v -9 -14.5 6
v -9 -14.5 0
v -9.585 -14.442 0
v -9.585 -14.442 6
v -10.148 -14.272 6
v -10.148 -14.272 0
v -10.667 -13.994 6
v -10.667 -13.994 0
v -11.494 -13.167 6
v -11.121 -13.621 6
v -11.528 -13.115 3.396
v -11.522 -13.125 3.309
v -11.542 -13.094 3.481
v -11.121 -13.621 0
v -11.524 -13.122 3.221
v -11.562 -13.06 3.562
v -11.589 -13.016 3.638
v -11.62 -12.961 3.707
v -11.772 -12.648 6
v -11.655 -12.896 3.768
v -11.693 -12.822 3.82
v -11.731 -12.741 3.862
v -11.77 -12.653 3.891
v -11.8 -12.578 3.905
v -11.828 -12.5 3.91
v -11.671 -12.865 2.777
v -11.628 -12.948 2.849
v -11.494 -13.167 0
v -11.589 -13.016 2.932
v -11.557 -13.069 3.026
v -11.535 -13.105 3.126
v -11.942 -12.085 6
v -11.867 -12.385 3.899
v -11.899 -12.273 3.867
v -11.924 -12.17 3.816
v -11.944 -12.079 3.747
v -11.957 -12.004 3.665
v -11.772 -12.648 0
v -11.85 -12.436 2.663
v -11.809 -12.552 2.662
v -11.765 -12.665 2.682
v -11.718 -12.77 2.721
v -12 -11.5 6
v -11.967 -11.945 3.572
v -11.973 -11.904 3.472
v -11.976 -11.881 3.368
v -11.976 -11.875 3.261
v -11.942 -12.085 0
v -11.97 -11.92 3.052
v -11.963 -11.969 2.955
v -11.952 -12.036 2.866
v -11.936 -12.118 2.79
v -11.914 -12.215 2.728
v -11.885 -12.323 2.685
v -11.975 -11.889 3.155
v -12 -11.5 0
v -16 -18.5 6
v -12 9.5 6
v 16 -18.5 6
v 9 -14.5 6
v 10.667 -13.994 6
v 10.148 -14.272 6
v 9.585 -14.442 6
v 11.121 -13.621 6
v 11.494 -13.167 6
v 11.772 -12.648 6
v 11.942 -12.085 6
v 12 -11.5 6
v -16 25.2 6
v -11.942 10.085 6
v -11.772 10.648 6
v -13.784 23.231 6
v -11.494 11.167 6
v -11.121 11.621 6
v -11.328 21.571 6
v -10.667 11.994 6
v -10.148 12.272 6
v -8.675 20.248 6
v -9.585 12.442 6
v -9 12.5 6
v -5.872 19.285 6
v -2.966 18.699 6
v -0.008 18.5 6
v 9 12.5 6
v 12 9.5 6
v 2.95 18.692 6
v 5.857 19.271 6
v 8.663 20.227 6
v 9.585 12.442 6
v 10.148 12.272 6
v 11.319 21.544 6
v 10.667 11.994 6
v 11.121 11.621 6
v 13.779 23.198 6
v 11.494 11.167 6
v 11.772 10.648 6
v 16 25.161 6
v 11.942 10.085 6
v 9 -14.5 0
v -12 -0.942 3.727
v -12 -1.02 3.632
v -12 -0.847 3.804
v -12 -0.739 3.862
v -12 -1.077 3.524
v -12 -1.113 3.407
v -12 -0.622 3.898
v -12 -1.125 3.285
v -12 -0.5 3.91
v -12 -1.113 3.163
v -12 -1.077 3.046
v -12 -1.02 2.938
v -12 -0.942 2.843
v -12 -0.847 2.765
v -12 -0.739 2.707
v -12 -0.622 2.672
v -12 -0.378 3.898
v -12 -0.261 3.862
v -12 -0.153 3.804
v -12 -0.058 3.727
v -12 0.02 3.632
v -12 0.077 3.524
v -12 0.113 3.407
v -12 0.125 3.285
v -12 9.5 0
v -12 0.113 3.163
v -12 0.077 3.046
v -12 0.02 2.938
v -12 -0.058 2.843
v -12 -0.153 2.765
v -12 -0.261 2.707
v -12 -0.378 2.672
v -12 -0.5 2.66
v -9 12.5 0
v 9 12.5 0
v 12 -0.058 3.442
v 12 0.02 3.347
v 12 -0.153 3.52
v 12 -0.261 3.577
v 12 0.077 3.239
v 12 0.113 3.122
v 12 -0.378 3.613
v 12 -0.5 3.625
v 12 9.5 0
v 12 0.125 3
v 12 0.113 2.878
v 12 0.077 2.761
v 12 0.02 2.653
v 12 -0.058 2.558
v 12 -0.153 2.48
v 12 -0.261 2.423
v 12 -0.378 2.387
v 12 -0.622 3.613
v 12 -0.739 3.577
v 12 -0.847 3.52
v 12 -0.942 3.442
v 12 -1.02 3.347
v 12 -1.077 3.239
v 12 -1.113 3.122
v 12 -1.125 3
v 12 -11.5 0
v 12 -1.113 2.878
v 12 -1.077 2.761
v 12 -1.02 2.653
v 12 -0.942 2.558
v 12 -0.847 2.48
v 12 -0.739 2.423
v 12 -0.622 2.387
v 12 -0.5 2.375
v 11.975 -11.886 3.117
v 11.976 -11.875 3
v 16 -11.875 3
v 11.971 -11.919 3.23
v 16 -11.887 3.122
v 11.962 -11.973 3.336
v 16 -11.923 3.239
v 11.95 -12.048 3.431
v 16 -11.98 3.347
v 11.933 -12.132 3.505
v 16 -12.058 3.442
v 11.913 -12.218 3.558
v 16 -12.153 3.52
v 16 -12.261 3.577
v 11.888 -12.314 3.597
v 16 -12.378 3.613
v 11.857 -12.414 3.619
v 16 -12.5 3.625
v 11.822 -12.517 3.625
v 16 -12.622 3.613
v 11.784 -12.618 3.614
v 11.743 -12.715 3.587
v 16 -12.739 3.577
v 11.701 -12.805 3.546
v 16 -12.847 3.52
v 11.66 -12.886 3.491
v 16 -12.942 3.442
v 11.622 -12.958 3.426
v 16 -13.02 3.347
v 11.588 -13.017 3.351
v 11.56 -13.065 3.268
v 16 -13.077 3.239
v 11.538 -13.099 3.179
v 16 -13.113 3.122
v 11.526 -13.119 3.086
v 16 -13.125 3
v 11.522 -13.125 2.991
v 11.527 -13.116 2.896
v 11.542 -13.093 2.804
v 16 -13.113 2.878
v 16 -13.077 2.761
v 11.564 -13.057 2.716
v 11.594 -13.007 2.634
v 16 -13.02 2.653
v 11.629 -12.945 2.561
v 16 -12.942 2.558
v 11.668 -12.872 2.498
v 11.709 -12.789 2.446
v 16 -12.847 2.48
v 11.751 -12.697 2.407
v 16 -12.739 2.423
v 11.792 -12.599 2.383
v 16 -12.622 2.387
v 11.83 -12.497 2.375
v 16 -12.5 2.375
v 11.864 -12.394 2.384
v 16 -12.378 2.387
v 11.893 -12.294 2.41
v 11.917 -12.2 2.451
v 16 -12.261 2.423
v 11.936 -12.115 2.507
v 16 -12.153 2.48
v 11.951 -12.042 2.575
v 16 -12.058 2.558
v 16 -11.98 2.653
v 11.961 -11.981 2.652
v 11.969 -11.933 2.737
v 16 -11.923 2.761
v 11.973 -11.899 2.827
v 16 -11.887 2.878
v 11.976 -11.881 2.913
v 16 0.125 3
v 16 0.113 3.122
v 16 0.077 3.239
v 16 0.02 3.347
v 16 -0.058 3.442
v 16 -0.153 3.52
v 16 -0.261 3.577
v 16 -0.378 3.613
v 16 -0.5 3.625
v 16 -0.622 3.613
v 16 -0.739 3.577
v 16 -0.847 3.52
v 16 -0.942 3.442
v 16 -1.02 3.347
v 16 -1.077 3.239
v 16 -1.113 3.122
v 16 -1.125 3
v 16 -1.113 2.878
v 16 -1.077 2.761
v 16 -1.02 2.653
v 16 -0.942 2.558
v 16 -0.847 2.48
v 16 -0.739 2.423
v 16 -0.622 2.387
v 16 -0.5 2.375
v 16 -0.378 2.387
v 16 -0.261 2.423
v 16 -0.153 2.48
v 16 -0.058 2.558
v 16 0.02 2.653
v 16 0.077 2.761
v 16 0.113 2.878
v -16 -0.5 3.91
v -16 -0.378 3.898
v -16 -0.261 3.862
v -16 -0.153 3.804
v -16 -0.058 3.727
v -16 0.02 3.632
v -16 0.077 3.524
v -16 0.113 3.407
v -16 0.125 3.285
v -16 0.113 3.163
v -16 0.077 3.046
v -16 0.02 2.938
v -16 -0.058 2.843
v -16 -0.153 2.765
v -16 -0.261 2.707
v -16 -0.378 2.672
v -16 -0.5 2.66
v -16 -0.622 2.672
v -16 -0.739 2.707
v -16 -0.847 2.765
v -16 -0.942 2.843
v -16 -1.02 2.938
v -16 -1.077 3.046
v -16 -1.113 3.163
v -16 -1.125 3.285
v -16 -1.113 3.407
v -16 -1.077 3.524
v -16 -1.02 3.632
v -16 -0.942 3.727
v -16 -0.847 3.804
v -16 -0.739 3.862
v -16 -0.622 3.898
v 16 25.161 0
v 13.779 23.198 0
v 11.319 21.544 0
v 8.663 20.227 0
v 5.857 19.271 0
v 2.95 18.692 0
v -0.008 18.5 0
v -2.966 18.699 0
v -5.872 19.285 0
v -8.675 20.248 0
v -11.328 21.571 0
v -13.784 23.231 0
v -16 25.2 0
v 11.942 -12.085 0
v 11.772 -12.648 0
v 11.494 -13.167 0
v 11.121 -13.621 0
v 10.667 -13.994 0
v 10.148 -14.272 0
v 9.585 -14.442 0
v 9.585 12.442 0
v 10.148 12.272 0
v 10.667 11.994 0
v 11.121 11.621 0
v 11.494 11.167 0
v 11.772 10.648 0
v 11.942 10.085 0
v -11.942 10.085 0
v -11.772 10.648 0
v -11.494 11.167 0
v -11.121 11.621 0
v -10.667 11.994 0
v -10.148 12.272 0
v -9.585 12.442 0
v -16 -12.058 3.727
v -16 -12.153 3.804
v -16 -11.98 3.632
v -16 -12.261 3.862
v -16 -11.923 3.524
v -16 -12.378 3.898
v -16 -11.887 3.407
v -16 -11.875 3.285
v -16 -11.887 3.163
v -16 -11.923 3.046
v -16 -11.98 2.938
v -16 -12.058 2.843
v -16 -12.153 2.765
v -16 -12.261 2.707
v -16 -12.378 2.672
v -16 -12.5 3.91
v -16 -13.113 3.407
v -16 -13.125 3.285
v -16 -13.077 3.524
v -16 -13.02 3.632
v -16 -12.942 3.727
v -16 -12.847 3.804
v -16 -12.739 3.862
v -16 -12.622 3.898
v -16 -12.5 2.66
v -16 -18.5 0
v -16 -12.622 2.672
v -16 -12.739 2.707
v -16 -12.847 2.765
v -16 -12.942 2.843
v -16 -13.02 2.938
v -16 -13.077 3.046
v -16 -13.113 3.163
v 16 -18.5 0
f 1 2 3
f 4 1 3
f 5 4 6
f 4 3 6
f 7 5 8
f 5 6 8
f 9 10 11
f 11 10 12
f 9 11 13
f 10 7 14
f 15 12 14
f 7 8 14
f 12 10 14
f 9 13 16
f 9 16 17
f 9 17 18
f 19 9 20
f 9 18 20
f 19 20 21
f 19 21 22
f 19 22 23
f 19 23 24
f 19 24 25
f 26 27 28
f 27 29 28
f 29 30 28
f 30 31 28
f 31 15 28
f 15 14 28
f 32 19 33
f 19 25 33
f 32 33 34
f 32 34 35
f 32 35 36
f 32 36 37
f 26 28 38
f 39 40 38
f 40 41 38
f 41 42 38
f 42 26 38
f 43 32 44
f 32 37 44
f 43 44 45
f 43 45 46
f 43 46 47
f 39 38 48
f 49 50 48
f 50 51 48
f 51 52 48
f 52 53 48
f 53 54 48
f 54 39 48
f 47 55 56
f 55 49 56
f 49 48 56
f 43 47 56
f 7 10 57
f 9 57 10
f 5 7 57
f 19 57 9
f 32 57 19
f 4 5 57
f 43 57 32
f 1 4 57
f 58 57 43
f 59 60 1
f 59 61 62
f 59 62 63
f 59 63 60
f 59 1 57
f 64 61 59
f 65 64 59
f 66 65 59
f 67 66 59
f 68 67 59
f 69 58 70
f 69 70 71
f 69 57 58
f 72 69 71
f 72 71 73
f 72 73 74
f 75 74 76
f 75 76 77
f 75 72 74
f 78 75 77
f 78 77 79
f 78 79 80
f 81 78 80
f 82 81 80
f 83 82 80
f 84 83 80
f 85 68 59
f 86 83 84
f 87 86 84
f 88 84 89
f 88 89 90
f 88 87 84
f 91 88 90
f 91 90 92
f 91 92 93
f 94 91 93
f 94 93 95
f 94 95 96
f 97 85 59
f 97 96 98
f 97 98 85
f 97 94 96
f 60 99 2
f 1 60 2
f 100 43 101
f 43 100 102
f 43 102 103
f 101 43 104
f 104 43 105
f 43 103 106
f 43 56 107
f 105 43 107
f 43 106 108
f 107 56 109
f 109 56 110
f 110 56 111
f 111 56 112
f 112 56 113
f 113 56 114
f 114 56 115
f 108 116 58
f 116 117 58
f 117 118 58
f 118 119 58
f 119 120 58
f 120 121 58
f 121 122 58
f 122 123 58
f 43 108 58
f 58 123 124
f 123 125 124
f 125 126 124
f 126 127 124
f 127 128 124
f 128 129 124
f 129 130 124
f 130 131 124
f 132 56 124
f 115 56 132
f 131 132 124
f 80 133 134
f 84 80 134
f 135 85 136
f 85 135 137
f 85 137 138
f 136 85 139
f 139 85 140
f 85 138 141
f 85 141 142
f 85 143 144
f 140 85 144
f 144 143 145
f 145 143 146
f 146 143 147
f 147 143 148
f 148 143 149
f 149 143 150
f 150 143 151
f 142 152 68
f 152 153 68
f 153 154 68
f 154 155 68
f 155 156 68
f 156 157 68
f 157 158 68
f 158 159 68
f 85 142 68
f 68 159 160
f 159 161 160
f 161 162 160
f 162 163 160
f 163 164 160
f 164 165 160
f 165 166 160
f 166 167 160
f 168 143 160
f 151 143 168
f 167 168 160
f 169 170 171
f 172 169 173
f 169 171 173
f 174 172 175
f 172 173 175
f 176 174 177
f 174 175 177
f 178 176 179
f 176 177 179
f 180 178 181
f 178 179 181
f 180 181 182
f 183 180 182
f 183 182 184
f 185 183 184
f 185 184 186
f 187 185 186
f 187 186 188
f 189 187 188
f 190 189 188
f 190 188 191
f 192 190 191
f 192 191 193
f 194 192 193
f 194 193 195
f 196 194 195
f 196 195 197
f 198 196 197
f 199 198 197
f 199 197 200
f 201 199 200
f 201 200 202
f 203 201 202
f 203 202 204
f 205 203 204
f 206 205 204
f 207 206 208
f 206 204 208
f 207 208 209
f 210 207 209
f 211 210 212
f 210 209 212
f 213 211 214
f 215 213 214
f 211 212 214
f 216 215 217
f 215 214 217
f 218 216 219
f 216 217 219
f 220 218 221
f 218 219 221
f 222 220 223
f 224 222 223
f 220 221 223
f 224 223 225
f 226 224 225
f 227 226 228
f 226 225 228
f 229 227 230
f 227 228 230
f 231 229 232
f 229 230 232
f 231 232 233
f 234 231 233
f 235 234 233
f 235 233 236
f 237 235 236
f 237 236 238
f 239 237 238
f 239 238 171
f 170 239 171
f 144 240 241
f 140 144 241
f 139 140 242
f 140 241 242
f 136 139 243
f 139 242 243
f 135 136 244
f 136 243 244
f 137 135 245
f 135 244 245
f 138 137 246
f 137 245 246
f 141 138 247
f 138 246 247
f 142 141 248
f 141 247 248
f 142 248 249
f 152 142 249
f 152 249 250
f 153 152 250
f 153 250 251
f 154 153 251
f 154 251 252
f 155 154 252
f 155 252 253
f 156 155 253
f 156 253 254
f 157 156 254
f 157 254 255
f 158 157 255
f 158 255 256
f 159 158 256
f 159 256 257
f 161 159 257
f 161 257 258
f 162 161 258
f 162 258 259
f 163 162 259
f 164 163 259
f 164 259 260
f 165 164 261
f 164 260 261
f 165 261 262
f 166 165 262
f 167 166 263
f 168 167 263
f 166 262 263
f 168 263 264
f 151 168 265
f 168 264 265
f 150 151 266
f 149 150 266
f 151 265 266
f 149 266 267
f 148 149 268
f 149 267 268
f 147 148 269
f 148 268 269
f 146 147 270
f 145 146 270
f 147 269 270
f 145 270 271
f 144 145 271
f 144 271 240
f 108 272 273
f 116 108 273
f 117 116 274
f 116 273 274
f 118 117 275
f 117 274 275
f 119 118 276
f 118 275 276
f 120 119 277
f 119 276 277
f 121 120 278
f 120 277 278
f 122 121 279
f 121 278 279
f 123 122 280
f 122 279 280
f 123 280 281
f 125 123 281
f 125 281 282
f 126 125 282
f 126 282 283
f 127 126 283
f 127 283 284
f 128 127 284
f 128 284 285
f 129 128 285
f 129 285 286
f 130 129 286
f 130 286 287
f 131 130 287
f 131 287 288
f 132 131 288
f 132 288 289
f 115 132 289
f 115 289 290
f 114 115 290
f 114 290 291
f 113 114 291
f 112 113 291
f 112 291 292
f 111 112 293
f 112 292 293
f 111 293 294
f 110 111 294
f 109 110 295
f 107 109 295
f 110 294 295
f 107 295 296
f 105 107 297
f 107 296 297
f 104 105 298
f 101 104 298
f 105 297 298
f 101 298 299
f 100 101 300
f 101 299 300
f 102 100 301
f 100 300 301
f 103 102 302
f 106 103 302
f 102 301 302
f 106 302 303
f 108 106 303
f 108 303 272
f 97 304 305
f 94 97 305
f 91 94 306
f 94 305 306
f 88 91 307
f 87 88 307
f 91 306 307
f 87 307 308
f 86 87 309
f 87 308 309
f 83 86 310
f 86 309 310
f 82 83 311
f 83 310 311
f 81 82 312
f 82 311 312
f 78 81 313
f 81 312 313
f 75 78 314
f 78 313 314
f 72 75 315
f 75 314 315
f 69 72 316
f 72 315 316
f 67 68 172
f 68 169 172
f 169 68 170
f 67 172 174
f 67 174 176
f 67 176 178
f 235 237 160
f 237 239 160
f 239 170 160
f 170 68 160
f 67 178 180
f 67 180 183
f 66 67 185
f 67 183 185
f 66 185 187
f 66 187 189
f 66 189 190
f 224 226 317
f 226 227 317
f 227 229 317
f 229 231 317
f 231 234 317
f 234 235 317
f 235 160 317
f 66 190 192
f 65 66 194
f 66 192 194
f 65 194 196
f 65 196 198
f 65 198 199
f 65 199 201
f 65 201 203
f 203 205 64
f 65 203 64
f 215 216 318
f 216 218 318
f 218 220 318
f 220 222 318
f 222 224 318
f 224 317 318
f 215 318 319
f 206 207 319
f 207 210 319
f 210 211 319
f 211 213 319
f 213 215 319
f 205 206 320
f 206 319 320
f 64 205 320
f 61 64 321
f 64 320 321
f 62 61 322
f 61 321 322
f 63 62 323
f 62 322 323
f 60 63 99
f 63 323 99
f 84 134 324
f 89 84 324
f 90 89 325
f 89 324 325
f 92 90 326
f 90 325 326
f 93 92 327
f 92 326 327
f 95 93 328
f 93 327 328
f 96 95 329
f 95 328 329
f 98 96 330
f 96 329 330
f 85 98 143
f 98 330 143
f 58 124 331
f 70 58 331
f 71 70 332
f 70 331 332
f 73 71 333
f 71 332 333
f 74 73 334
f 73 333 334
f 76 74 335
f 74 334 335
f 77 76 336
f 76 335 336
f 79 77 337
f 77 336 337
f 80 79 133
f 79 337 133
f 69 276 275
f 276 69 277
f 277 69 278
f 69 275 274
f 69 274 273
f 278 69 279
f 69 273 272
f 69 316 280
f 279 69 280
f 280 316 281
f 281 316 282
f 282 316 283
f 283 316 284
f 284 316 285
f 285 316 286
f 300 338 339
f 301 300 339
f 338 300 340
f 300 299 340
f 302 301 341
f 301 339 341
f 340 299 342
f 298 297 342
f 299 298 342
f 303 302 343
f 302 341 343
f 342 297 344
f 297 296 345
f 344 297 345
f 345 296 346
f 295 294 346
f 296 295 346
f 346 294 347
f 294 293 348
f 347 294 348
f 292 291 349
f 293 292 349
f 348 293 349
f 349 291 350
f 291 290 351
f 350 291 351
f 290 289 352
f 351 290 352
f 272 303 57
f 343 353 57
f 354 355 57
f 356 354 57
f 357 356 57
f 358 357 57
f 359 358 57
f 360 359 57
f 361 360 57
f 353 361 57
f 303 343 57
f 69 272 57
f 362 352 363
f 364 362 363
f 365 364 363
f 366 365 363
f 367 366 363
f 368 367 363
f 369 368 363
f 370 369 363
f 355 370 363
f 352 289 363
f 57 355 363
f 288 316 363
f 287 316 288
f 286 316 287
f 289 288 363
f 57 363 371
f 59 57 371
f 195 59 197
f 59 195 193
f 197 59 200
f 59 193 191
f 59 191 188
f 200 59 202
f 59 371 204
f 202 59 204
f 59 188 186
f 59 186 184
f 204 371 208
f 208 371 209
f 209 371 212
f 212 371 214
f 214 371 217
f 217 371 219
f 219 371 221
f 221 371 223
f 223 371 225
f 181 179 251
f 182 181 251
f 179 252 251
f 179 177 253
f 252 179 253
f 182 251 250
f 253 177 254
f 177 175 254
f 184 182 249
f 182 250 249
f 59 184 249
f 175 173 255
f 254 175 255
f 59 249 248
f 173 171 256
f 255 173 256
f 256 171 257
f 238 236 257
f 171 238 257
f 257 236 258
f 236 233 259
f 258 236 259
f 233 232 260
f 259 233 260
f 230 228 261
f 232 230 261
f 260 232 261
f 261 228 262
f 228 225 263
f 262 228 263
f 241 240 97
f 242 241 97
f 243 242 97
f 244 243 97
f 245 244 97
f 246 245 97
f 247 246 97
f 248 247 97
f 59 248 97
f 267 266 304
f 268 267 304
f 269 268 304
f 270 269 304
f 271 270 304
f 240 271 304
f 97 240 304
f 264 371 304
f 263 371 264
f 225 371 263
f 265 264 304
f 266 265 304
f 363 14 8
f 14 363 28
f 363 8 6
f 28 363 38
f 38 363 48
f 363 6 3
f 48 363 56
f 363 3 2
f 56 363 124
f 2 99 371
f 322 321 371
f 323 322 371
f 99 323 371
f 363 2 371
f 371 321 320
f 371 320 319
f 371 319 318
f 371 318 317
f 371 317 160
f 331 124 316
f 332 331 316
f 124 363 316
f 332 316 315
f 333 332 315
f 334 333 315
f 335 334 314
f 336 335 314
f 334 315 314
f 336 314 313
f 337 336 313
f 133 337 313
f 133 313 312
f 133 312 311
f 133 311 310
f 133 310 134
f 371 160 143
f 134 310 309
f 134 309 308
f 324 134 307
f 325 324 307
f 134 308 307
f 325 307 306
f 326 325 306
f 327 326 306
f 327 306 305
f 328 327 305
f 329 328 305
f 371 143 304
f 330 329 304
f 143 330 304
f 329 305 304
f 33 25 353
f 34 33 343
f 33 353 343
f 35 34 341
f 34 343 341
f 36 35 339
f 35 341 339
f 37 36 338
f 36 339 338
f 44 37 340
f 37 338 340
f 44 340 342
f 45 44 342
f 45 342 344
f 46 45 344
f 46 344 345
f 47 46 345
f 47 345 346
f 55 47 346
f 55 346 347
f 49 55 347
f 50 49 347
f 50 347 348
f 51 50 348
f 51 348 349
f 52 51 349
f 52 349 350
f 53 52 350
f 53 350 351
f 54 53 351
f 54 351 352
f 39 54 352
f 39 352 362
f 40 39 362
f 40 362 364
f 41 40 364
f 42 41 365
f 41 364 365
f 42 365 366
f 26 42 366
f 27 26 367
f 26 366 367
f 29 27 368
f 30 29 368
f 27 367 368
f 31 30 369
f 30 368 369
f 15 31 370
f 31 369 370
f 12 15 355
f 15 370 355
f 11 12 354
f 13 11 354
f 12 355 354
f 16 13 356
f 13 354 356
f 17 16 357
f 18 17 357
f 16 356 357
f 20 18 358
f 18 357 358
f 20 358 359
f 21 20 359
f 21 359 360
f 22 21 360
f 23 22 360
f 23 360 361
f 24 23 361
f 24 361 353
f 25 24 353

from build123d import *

# Parameters (mm, degrees)
BOSS_EXTRU_1_DEPTH      = 6
ESQUISSE3_R             = 0.625
ENL_V_MAT_EXTRU_4_DEPTH = 6
ESQUISSE4_R             = 0.625
ENL_V_MAT_EXTRU_5_DEPTH = 6


with BuildPart() as part:
    # Esquisse1 → Boss.-Extru.1 (new body)
    with BuildSketch(Plane.XY):
        with BuildLine():
            Line((-16, 25.2), (-16, -18.5))
            Line((-16, -18.5), (16, -18.5))
            Line((16, -18.5), (16, 25.161446269))
            ThreePointArc((16, 25.161446269), (-0.008048953, 18.500008258), (-16, 25.2))
        make_face()
        with BuildLine():
            ThreePointArc((-9, -14.5), (-11.121320344, -13.621320344), (-12, -11.5))
            Line((-12, -11.5), (-12, 9.5))
            ThreePointArc((-12, 9.5), (-11.121320344, 11.621320344), (-9, 12.5))
            Line((-9, 12.5), (9, 12.5))
            ThreePointArc((9, 12.5), (11.121320344, 11.621320344), (12, 9.5))
            Line((12, 9.5), (12, -11.5))
            ThreePointArc((12, -11.5), (11.121320344, -13.621320344), (9, -14.5))
            Line((9, -14.5), (-9, -14.5))
        make_face(mode=Mode.SUBTRACT)
    extrude(amount=BOSS_EXTRU_1_DEPTH)

    # Esquisse3 → Enlèv. mat.-Extru.4 (cut)
    with BuildSketch(Plane(origin=(16, 0, 0), x_dir=(0, 0, -1), z_dir=(1, 0, 0))):
        with Locations(Location((-3, -0.5, 0), (0, 0, 90))):
            Circle(ESQUISSE3_R)
        with Locations(Location((-3, -12.5, 0), (0, 0, 90))):
            Circle(ESQUISSE3_R)
    extrude(amount=-ENL_V_MAT_EXTRU_4_DEPTH, mode=Mode.SUBTRACT)

    # Esquisse4 → Enlèv. mat.-Extru.5 (cut)
    with BuildSketch(Plane.ZY.offset(16)):
        with Locations((3.284775488, -12.5)):
            Circle(ESQUISSE4_R)
        with Locations((3.284775488, -0.5)):
            Circle(ESQUISSE4_R)
    extrude(amount=-ENL_V_MAT_EXTRU_5_DEPTH, mode=Mode.SUBTRACT)


solid = part.part
